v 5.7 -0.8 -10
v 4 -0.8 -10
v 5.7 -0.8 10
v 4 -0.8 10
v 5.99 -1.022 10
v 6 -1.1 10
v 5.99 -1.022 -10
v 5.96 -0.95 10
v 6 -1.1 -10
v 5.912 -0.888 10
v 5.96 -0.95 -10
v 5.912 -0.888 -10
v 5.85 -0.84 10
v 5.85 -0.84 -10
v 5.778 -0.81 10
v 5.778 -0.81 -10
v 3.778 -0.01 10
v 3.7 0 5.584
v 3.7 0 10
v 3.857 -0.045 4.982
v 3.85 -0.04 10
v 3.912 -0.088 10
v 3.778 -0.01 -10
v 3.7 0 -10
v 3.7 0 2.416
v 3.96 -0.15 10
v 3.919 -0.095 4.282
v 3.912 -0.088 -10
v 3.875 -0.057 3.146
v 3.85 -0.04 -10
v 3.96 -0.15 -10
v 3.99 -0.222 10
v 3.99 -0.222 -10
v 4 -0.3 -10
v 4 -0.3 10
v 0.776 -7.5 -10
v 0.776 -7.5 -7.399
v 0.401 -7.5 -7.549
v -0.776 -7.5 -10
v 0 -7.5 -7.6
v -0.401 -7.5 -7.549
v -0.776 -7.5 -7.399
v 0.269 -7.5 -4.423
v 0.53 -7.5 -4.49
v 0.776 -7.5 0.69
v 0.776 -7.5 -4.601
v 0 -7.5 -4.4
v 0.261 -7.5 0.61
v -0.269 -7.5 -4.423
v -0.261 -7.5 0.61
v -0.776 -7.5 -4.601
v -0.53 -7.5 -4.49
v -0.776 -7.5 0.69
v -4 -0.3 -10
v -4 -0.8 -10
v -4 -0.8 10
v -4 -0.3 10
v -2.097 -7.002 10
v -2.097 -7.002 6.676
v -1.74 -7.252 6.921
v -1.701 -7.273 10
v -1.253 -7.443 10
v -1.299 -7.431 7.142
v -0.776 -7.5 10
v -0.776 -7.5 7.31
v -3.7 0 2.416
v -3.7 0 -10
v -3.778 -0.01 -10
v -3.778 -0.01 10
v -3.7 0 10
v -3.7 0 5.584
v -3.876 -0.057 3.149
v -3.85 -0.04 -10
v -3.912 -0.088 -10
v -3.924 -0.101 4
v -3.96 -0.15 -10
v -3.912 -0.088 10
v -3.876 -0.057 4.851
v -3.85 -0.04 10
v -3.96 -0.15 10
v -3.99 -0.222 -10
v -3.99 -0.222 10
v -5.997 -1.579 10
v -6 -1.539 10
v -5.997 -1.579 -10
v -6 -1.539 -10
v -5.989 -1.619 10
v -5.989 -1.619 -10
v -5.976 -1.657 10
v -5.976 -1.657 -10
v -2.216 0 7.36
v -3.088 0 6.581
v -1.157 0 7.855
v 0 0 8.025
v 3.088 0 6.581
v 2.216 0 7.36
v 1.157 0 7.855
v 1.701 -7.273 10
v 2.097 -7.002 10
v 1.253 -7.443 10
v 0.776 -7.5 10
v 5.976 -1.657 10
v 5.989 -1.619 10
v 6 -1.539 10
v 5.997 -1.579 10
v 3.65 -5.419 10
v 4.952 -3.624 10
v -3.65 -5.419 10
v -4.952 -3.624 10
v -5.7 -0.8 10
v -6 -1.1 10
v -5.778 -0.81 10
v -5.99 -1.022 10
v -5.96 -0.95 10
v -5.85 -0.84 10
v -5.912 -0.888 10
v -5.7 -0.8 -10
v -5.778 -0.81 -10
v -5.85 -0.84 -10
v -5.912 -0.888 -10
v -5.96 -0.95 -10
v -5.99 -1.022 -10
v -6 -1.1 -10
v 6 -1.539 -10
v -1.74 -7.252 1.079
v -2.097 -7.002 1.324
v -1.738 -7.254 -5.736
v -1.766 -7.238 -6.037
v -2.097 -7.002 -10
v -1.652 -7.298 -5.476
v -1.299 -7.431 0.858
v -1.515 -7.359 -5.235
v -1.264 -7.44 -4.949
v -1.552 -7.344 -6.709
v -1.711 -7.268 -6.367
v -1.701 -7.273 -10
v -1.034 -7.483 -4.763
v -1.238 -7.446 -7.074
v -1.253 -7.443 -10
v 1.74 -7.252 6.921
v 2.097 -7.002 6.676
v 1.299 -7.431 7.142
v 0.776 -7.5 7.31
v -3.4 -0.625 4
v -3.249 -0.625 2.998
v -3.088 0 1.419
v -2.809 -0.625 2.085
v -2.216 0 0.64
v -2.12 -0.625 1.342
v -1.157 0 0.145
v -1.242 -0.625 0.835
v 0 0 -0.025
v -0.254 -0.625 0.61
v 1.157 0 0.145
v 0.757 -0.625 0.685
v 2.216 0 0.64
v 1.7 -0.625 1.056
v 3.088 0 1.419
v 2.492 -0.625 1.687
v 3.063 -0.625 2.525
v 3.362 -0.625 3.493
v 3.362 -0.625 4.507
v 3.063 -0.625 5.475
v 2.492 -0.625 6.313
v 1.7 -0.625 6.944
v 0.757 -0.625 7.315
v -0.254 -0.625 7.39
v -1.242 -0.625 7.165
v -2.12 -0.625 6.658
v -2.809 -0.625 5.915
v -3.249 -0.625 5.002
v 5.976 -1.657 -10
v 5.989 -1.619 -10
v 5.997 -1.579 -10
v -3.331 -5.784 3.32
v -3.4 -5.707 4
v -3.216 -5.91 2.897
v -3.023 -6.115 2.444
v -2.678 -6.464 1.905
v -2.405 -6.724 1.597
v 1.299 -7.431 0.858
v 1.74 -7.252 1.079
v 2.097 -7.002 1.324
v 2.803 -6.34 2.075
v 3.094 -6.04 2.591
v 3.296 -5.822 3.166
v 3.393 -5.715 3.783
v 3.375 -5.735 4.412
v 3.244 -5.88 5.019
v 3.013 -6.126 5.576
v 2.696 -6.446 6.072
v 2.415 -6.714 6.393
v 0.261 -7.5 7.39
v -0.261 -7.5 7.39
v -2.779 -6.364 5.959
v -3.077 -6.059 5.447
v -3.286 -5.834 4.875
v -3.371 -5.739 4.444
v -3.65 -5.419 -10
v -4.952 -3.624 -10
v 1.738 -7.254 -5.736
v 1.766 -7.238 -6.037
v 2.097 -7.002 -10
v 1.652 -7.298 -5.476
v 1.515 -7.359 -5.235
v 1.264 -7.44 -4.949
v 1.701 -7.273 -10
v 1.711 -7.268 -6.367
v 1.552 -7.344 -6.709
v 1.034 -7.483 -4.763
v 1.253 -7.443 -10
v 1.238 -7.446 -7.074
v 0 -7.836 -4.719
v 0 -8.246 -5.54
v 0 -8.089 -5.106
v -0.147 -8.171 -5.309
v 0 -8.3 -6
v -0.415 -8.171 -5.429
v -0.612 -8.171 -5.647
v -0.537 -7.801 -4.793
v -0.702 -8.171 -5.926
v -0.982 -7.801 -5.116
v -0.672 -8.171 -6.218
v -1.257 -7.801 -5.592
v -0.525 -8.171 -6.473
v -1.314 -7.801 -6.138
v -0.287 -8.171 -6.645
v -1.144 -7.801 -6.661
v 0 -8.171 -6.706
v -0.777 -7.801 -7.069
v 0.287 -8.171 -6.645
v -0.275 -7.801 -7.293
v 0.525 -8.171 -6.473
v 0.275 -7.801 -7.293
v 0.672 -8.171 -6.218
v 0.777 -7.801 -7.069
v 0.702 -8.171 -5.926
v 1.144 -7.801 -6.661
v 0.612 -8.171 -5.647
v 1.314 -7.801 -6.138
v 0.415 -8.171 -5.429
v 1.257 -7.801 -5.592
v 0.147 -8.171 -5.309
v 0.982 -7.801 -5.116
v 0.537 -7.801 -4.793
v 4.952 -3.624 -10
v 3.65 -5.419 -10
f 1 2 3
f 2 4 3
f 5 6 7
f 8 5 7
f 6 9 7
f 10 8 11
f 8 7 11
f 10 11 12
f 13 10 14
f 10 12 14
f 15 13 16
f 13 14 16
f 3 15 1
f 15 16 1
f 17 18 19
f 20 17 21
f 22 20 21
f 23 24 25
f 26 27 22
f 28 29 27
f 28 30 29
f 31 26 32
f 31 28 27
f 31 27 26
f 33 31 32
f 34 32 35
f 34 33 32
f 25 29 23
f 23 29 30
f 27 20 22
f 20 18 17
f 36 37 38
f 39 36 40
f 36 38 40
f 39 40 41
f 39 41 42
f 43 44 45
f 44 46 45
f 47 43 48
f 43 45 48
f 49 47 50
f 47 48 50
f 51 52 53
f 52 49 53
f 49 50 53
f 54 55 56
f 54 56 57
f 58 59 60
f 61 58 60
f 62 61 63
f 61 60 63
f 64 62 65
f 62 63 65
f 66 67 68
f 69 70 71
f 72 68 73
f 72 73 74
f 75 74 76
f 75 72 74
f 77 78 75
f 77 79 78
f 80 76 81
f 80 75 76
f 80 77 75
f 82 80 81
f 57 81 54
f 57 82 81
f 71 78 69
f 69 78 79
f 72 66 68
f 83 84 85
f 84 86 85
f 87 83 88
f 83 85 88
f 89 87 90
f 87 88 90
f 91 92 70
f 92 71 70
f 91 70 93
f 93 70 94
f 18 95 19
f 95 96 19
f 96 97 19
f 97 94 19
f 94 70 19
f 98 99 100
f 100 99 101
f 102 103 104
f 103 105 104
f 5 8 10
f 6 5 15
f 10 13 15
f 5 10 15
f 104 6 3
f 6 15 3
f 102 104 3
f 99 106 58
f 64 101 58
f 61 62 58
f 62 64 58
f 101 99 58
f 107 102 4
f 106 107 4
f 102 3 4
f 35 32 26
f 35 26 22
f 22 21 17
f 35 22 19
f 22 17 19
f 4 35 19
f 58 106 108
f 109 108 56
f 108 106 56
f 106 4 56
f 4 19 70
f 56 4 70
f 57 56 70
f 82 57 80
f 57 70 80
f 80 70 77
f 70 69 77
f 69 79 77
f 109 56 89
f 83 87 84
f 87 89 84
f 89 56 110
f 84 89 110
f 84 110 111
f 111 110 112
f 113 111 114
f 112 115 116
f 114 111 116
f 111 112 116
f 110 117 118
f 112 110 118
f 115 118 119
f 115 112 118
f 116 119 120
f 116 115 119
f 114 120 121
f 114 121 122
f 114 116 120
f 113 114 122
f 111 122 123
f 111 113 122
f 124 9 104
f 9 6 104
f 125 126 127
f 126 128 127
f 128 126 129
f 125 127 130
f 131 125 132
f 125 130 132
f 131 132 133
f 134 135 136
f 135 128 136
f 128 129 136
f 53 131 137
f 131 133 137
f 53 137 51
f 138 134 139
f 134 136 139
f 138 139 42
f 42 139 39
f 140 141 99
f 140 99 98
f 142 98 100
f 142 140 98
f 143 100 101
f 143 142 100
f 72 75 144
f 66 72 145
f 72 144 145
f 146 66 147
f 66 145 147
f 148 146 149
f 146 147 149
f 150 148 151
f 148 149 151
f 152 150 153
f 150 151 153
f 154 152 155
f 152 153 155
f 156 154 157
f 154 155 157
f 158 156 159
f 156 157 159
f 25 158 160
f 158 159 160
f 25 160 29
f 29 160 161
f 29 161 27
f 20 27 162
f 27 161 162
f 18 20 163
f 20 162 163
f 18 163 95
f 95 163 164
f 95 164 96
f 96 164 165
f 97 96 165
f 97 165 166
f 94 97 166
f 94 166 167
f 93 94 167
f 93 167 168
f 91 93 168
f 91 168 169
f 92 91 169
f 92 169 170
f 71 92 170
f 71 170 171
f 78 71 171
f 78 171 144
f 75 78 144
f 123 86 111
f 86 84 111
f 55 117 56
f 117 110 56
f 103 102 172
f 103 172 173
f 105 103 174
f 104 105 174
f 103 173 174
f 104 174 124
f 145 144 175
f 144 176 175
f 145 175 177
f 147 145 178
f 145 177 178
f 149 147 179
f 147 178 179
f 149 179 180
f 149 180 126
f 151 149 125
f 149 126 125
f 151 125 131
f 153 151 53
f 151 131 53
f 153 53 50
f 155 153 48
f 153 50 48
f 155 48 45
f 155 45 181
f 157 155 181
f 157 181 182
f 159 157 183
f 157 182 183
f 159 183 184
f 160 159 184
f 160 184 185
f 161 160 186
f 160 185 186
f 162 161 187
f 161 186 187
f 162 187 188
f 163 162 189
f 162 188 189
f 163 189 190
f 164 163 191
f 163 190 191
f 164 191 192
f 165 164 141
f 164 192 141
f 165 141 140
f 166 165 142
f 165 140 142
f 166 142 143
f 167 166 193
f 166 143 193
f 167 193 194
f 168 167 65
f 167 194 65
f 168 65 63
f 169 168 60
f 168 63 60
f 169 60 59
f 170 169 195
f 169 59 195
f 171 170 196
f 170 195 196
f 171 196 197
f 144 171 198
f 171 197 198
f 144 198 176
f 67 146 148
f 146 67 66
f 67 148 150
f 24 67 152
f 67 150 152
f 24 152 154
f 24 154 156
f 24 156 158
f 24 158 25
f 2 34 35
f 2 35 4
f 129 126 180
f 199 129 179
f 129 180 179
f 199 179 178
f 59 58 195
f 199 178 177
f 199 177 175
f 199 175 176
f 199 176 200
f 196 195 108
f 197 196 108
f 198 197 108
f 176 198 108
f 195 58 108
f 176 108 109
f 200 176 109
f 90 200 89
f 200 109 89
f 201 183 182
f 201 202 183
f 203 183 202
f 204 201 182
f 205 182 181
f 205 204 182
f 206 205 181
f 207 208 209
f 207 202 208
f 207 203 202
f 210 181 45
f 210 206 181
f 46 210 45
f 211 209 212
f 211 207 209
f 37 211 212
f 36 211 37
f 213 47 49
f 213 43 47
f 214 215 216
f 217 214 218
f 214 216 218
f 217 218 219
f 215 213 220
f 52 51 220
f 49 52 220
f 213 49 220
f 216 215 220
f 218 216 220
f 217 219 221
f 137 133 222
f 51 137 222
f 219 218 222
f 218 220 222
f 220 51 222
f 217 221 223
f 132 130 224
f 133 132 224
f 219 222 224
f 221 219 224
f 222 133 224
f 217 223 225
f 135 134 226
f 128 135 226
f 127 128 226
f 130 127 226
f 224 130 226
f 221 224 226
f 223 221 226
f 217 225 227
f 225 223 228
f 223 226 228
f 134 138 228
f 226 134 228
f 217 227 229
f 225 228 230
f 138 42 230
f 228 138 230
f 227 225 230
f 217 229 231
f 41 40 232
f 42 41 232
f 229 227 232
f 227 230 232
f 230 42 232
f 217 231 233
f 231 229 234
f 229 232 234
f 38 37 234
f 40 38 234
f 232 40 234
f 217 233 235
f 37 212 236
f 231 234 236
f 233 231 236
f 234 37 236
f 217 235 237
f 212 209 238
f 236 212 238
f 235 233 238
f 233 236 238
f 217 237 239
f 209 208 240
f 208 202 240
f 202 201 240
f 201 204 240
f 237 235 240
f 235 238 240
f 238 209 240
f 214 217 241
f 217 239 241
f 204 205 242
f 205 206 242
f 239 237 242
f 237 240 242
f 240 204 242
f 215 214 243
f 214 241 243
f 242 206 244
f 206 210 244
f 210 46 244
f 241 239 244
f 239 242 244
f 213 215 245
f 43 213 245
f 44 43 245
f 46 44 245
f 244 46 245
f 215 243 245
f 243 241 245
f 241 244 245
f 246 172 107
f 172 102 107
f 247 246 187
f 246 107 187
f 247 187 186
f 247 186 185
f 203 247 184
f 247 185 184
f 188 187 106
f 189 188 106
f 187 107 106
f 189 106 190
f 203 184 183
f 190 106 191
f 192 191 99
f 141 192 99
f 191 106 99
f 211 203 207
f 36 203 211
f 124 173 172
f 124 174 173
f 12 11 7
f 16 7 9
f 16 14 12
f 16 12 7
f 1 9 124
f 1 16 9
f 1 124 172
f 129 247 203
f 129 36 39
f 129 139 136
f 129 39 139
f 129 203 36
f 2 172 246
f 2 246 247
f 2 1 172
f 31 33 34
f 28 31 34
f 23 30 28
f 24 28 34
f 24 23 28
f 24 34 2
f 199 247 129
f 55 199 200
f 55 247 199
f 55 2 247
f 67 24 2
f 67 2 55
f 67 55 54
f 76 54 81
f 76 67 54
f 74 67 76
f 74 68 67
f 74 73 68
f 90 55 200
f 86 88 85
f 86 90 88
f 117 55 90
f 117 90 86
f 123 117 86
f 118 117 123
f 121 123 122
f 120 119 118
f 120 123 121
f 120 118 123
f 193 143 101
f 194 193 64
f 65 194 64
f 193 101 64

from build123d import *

# Parameters (mm, degrees)
EXTRUDE_1_DEPTH             = 10
FILLET_1_R                  = 0.3
FILLET_2_R                  = 2
HOLE_WIZARD_M81_D           = 6.8
HOLE_WIZARD_M81_CSINK_D     = 8.05
HOLE_WIZARD_M81_CSINK_ANGLE = 90


with BuildPart() as part:
    # Эскиз1 → Бобышка-Вытянуть1 (new body, symmetric)
    with BuildSketch(Plane.XY):
        with BuildLine():
            Line((-4, 0), (4, 0))
            Line((4, 0), (4, -0.8))
            Line((4, -0.8), (6, -0.8))
            Line((6, -0.8), (6, -1.6))
            ThreePointArc((6, -1.6), (4.120585945, -4.832650297), (1.5, -7.5))
            Line((1.5, -7.5), (-1.5, -7.5))
            ThreePointArc((-1.5, -7.5), (-4.120585945, -4.832650297), (-6, -1.6))
            Line((-6, -1.6), (-6, -0.8))
            Line((-6, -0.8), (-4, -0.8))
            Line((-4, -0.8), (-4, 0))
        make_face()
    extrude(amount=EXTRUDE_1_DEPTH, both=True)

    # Скругление1
    fillet_1_edges = [part.edges().sort_by_distance(p)[0] for p in [
        (6, -0.8, 0),
        (6, -1.6, 0),
        (-6, -1.6, 0),
        (-6, -0.8, 0),
        (-4, 0, 0),
        (4, 0, 0),
    ]]
    fillet(fillet_1_edges, radius=FILLET_1_R)

    # Скругление2
    fillet_2_edges = [part.edges().sort_by_distance(p)[0] for p in [
        (1.5, -7.5, 0),
        (-1.5, -7.5, 0),
    ]]
    fillet(fillet_2_edges, radius=FILLET_2_R)

    # Отверстие обработанное метчиком M81 (through all)
    with Locations(Plane(origin=(0, 0, 0), x_dir=(1, 0, 0), z_dir=(0, 1, 0))):
        with Locations((0, -4)):
            CounterSinkHole(HOLE_WIZARD_M81_D / 2, HOLE_WIZARD_M81_CSINK_D / 2, counter_sink_angle=HOLE_WIZARD_M81_CSINK_ANGLE)

    # Эскиз5 → Повернуть1 (revolve)
    with BuildSketch(Plane(origin=(0, 0, 0), x_dir=(0, 0, -1), z_dir=(1, 0, 0))):
        with BuildLine():
            Line((6, -4.3), (6, -8.3))
            ThreePointArc((6, -8.3), (4, -6.3), (6, -4.3))
        make_face()
    revolve(axis=Axis((0, -4.3, -6), (0, -1, 0)))


solid = part.part
